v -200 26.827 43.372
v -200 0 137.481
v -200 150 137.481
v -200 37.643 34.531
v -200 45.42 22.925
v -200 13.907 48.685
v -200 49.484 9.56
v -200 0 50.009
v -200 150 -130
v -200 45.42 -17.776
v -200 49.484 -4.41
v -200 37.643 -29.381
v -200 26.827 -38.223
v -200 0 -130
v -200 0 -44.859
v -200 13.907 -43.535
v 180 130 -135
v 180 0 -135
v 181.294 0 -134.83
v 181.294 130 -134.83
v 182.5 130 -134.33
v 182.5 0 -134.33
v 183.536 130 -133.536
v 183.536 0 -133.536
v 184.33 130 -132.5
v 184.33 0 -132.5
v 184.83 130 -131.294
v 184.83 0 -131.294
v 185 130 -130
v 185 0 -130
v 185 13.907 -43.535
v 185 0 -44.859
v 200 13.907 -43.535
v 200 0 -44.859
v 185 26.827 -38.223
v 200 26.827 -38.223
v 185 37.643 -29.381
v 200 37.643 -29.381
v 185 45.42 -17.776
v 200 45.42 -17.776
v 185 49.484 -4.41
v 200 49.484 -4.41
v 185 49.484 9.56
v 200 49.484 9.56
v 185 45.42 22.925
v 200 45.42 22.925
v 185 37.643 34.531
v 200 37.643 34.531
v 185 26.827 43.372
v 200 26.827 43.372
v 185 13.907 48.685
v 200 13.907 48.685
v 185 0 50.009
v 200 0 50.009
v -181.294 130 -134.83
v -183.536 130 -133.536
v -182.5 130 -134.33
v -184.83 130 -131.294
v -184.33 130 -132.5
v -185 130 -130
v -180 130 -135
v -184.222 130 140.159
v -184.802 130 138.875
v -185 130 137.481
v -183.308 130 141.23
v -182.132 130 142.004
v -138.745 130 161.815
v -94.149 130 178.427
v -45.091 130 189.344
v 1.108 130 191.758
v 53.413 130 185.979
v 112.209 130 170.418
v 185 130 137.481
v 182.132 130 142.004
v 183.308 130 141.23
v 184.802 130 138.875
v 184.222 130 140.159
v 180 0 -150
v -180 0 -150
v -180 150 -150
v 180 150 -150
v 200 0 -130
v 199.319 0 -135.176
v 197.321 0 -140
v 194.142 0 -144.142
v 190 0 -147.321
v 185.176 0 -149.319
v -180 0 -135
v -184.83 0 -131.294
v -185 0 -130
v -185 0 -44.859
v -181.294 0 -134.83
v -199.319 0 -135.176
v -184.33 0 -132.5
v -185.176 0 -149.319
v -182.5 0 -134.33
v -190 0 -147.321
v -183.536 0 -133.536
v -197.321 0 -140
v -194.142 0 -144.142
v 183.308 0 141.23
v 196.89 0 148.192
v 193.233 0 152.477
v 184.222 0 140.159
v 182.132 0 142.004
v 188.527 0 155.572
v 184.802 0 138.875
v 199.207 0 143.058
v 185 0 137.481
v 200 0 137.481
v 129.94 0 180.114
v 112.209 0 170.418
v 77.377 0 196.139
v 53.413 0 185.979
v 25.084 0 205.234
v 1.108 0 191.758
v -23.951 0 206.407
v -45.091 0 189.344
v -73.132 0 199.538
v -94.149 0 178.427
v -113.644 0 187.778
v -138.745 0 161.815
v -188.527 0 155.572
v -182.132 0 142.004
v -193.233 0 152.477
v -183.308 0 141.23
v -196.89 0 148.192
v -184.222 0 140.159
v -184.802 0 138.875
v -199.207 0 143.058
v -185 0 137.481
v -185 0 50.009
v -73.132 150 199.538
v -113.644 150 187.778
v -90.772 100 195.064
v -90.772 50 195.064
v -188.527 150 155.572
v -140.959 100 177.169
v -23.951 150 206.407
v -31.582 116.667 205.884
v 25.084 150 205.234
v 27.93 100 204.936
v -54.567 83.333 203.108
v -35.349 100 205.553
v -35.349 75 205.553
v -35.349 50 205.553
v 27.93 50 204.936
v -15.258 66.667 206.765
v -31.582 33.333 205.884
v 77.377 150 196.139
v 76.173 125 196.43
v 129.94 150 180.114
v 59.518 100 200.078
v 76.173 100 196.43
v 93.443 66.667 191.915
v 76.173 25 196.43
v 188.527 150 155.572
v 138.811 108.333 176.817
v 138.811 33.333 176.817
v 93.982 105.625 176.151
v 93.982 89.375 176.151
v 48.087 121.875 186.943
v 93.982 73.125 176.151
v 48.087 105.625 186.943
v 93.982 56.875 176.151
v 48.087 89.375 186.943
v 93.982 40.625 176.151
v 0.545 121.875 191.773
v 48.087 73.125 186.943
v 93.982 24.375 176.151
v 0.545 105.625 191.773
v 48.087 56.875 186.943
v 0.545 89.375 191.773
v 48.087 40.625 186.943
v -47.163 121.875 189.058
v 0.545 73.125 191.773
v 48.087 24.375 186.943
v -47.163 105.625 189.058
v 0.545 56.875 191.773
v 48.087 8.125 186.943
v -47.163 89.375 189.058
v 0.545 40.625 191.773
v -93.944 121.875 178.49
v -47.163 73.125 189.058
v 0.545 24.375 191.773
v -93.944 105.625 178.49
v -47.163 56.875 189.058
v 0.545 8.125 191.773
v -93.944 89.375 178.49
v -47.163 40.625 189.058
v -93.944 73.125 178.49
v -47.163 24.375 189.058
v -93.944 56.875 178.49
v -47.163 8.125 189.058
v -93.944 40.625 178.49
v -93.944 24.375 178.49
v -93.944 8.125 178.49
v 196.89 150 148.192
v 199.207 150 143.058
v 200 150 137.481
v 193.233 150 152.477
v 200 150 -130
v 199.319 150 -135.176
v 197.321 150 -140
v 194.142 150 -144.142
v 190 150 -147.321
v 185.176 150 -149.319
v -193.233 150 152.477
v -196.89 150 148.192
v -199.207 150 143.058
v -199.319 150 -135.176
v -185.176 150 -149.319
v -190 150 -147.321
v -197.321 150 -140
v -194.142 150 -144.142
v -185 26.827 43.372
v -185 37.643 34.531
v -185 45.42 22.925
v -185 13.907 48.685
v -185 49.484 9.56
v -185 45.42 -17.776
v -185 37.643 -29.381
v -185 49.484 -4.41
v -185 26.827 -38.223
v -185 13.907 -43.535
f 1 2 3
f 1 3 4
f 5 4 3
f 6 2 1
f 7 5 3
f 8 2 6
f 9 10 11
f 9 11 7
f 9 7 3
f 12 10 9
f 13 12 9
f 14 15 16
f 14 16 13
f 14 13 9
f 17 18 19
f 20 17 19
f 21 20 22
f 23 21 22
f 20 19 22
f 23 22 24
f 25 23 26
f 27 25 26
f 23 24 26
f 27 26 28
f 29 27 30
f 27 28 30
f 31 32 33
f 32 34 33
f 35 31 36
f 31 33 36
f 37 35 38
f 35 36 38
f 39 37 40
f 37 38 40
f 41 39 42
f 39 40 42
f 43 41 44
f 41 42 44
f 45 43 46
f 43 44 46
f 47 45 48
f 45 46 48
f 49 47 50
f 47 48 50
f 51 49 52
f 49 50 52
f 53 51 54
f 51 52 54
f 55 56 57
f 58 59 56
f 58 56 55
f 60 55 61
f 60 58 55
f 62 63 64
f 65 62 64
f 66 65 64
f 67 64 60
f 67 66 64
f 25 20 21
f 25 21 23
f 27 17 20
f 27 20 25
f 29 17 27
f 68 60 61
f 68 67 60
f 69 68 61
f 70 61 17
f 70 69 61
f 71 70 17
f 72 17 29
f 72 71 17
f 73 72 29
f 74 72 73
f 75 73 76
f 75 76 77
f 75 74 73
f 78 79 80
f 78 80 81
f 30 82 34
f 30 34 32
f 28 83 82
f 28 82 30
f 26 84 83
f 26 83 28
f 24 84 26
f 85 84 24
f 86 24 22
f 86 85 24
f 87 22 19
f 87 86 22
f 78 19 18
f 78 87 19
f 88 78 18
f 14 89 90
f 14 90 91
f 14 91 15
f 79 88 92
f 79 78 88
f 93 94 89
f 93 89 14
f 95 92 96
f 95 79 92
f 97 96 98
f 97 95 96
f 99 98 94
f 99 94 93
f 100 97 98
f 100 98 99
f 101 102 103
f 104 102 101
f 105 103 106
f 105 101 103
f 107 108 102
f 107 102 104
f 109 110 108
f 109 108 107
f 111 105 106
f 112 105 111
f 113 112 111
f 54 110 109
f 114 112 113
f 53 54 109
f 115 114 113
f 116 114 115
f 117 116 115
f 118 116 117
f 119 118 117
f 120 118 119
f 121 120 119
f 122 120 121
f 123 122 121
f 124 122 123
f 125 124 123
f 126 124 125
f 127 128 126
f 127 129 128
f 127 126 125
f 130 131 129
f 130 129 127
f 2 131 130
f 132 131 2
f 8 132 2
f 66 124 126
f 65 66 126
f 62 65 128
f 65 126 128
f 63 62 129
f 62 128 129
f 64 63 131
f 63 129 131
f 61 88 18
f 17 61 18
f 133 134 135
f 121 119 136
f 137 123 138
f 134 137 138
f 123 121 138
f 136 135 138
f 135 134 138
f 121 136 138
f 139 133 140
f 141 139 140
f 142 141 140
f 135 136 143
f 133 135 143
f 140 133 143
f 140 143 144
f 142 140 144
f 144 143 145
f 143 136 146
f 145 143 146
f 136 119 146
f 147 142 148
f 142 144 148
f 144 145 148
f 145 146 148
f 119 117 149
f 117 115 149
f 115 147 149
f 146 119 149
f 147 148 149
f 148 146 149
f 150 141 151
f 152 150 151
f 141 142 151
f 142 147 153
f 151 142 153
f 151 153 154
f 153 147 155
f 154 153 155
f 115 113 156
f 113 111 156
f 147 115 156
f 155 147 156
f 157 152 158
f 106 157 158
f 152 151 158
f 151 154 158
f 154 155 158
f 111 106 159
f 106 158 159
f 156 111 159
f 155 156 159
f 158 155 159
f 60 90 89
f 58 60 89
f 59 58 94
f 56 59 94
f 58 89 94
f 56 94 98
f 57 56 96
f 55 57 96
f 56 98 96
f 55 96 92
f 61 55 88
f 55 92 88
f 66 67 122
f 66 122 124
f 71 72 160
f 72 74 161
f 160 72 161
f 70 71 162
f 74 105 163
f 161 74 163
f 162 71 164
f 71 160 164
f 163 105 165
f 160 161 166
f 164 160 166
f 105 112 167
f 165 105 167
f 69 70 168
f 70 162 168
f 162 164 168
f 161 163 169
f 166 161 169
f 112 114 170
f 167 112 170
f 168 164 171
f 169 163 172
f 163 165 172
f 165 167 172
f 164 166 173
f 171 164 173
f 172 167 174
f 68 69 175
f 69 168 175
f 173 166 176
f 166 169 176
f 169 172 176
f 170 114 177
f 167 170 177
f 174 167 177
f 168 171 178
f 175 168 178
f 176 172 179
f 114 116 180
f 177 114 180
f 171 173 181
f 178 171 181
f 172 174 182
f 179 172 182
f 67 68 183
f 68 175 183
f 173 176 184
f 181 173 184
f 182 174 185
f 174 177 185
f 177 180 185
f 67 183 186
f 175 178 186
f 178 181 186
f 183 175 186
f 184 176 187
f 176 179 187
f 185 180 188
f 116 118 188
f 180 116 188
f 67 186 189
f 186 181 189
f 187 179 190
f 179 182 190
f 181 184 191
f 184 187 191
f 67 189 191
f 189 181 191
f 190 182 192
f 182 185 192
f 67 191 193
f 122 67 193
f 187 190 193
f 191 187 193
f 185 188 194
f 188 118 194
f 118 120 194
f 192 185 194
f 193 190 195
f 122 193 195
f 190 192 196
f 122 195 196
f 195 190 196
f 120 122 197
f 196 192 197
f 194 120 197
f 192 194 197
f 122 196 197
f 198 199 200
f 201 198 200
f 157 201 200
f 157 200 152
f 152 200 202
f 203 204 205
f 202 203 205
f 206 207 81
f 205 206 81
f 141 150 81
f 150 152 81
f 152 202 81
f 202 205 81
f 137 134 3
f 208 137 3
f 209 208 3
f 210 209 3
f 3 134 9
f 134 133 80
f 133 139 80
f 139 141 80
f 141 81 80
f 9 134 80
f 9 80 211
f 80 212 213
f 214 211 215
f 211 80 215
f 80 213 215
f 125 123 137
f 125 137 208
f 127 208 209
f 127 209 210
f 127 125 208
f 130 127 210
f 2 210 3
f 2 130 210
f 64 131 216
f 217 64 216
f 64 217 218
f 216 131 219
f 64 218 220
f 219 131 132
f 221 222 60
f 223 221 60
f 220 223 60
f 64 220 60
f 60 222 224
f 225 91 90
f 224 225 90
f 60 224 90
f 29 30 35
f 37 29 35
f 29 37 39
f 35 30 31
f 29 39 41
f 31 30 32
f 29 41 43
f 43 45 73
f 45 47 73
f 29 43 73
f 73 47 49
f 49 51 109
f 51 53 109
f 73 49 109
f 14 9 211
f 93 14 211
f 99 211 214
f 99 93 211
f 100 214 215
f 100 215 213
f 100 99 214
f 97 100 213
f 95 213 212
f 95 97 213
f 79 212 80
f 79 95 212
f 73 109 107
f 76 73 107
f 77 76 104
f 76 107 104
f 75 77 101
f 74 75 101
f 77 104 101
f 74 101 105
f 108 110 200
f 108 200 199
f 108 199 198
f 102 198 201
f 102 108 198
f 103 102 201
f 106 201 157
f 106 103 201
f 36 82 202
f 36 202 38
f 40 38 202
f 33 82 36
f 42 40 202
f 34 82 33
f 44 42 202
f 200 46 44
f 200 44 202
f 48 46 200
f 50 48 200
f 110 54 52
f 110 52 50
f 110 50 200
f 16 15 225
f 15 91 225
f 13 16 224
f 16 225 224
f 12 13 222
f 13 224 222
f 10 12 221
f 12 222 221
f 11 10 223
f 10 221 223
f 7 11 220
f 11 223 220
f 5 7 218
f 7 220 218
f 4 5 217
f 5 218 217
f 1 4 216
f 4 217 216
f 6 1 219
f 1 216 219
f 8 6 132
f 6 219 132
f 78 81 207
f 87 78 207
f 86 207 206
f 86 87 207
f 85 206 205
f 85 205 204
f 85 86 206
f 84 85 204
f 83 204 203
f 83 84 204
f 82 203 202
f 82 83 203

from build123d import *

# Parameters (mm, degrees)
BOSS_EXTRUDE5_DEPTH = 150
CUT_EXTRUDE4_DEPTH  = 130
SKETCH8_R           = 47.5
CUT_EXTRUDE5_DEPTH  = 475.65402898


with BuildPart() as part:
    # Sketch1 → Boss-Extrude5 (new body)
    with BuildSketch(Plane(origin=(0, 0, 0), x_dir=(1, 0, 0), z_dir=(0, 1, 0))):
        with BuildLine():
            Line((-180, 150), (180, 150))
            ThreePointArc((180, 150), (194.142135624, 144.142135624), (200, 130))
            Line((200, 130), (200, -137.480797285))
            ThreePointArc((200, -137.480797285), (196.889858076, -148.19213213), (188.526730584, -155.572089819))
            add(Edge.make_bspline(
                [(-188.526730584, -155.572089819), (-94.263365292, -200), (0, -244.427910181), (188.526730584, -155.572089819)],
                knots=[0, 0, 0, 0, 1, 1, 1, 1], degree=3))
            ThreePointArc((-188.526730584, -155.572089819), (-196.889858076, -148.19213213), (-200, -137.480797285))
            Line((-200, -137.480797285), (-200, 130))
            ThreePointArc((-200, 130), (-194.142135624, 144.142135624), (-180, 150))
        make_face()
    extrude(amount=BOSS_EXTRUDE5_DEPTH)

    # Sketch7 → Cut-Extrude4 (cut)
    with BuildSketch(Plane.XZ):
        with BuildLine():
            Line((-180, -135), (180, -135))
            ThreePointArc((180, -135), (183.535533906, -133.535533906), (185, -130))
            Line((185, -130), (185, 137.480797285))
            ThreePointArc((185, 137.480797285), (184.222464519, 140.158630996), (182.131682646, 142.003620419))
            add(Edge.make_bspline(
                [(182.131682646, 142.003620419), (167.754395175, 148.779877923), (153.243793404, 155.096016084), (123.887544981, 166.571922609), (109.042273823, 171.732986949), (86.451364448, 178.35977611), (78.866974419, 180.382030951), (63.574333937, 183.999050287), (55.866097219, 185.593862184), (40.307101742, 188.29158715), (32.456347746, 189.394516661), (20.556839665, 190.62308876), (16.569747475, 190.961550457), (8.551333739, 191.485821191), (4.544231323, 191.669927655), (-7.454411488, 191.980616602), (-15.430189587, 191.865523988), (-31.333284121, 190.965648075), (-39.260577272, 190.180543026), (-51.114854999, 188.496254108), (-55.060184136, 187.85057332), (-60.969143231, 186.757203044), (-62.937291634, 186.371953854), (-66.870612209, 185.560327), (-68.836067076, 185.13383579), (-78.618097665, 182.909176108), (-86.329542172, 180.827443766), (-101.559170643, 176.152807331), (-109.077405353, 173.560037463), (-123.963089417, 167.97567232), (-131.330609371, 164.984263785), (-153.278917059, 155.602043077), (-167.705359418, 148.8029893), (-182.131682646, 142.003620419)],
                knots=[0, 0, 0, 0, 0.125, 0.125, 0.25, 0.25, 0.3125, 0.3125, 0.375, 0.375, 0.4375, 0.4375, 0.46875, 0.46875, 0.5, 0.5, 0.5625, 0.5625, 0.625, 0.625, 0.65625, 0.65625, 0.671875, 0.671875, 0.6875, 0.6875, 0.75, 0.75, 0.8125, 0.8125, 0.875, 0.875, 1, 1, 1, 1], degree=3))
            ThreePointArc((-182.131682646, 142.003620419), (-184.222464519, 140.158630996), (-185, 137.480797285))
            Line((-185, 137.480797285), (-185, -130))
            ThreePointArc((-185, -130), (-183.535533906, -133.535533906), (-180, -135))
        make_face()
    extrude(amount=-CUT_EXTRUDE4_DEPTH, mode=Mode.SUBTRACT)

    # Sketch8 → Cut-Extrude5 (cut, through all)
    with BuildSketch(Plane(origin=(200, 0, 0), x_dir=(0, 0, -1), z_dir=(1, 0, 0))):
        with Locations((-2.574719222, 2.5)):
            Circle(SKETCH8_R)
    extrude(amount=-CUT_EXTRUDE5_DEPTH, mode=Mode.SUBTRACT)


solid = part.part
